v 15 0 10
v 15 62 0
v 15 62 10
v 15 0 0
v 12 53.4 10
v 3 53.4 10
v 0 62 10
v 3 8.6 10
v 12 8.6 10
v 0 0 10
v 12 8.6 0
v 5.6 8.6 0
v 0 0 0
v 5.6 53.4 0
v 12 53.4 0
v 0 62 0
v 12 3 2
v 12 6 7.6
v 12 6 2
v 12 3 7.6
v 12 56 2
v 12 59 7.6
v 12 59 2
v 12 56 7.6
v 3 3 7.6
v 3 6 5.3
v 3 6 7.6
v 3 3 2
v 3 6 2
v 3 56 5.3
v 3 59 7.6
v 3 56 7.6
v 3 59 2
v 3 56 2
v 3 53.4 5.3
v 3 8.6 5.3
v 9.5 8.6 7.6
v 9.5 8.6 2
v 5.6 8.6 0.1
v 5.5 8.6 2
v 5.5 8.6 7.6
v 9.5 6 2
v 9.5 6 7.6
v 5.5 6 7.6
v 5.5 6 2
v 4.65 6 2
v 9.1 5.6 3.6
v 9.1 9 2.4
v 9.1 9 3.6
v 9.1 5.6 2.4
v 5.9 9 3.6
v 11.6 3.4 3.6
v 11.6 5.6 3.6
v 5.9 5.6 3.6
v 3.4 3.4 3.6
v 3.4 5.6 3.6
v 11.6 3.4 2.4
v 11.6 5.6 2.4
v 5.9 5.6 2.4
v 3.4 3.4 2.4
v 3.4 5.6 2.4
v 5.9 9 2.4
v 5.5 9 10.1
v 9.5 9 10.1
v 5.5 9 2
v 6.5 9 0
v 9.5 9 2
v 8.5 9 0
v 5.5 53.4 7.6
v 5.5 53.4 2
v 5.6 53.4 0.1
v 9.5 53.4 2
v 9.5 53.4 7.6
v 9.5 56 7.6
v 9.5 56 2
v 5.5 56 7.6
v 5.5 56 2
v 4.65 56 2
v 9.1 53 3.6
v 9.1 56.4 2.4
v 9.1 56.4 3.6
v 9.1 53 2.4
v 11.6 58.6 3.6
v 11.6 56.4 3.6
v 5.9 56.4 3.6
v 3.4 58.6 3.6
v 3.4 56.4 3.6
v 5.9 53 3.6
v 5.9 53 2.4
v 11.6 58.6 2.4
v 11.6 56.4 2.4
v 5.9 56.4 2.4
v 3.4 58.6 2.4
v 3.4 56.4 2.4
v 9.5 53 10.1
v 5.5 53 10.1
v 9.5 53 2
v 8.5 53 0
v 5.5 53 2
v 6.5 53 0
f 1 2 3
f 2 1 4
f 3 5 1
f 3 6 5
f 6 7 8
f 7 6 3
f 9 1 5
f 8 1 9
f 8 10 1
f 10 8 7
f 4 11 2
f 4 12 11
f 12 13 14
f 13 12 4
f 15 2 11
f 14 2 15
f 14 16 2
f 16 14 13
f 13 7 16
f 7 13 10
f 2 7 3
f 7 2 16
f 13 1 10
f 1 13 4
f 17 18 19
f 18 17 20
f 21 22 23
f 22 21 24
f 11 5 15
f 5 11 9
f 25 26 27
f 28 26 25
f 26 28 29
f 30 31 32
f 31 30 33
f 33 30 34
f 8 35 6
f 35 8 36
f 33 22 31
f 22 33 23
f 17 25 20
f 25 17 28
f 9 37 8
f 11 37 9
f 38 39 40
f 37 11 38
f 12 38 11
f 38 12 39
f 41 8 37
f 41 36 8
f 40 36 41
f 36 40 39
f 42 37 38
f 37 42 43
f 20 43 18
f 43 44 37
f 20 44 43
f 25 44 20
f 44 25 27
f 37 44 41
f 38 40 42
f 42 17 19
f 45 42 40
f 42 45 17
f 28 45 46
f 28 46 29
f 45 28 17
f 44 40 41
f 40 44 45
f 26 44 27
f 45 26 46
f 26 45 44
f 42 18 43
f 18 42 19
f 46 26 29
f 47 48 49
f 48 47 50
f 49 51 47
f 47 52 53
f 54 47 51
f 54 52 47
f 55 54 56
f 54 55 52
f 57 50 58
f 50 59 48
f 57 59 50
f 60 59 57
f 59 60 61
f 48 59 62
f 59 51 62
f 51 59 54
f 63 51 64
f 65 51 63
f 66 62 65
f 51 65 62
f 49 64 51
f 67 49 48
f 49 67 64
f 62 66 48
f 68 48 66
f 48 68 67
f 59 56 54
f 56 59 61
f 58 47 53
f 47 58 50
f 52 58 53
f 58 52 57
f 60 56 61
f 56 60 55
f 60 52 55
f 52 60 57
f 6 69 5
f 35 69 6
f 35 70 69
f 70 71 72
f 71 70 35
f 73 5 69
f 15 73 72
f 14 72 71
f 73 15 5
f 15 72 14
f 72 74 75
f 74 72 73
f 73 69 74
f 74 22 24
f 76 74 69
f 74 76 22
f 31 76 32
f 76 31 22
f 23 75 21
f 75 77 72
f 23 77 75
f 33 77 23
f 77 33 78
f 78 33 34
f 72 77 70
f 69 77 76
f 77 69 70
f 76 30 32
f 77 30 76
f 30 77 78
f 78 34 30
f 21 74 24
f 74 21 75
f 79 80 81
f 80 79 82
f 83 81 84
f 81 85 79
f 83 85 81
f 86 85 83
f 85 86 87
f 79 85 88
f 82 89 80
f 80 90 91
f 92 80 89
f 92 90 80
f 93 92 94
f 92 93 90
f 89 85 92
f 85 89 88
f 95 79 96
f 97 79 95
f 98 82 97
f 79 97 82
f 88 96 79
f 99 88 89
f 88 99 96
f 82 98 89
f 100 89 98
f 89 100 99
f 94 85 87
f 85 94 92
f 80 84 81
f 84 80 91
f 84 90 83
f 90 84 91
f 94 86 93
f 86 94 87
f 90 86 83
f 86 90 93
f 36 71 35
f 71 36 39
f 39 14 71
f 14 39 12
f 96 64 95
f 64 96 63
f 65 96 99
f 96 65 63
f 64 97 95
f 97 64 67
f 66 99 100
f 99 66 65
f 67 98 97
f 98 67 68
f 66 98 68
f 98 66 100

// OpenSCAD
/*this mechanical buckle allows the strap to pass in one direction
the moving part moves up and down
moving up allows the strap to pass
moving down will hold on the satrap and lock it in the place
it could be used in tightning the strap for the tourniquet
instead of using dual lock velcro
**this still work in progress and not finished yet

*/
cylinder_r=2;
buckle_l=15;
buckle_w=62;
buckle_h=10;
wall_b=3;
clr=.4;
mech_t=3;
mech_t2=2;
mech_w1=4;
mech_w2=9;




difference(){
    cube([buckle_l,buckle_w,buckle_h]);
      translate([wall_b,wall_b,0])  cube([buckle_l-2*wall_b,buckle_w-2*wall_b,buckle_h]);
}
//the inside cyl
//difference(){
translate([0,wall_b+mech_t,0])hull(){//the body of the curve

translate([buckle_l/2-2,0,0])cube([.1,buckle_w-2*(wall_b+mech_t),.1]);
translate([buckle_l/2-5,0,6])cube([.1,buckle_w-2*(wall_b+mech_t),.1]);
cube([.1,buckle_w-2*(wall_b+mech_t),.1]);
}

//translate([buckle_l/2,0,3])rotate([-90,0,0])cylinder(r=cylinder_r+1,h=buckle_w);//the curvy cut
//}
//translate([buckle_l/2,wall_b+2*mech_t,2.84])rotate([-90,0,0])cylinder(r=cylinder_r,h=buckle_w-2*wall_b-4*mech_t,$fn=6);
hull(){
translate([buckle_l/2-cylinder_r/2,wall_b+2*mech_t,0])cube([cylinder_r,buckle_w-2*wall_b-4*mech_t,.1]);

translate([buckle_l/2-cylinder_r,wall_b+2*mech_t,cylinder_r])cube([2*cylinder_r,buckle_w-2*wall_b-4*mech_t,.1]);
translate([buckle_l/2-cylinder_r,wall_b+2*mech_t,buckle_h])cube([2*cylinder_r,buckle_w-2*wall_b-4*mech_t,.1]);
}
//end of inside cyl

//mechanicals
module mechs(){
translate([.5*buckle_l-mech_w1/2+clr,wall_b+mech_t-clr,mech_t2+clr])cube([mech_w1-2*clr,mech_t+clr,2*cylinder_r-mech_t2-2*clr]);//neck

translate([.5*buckle_l-mech_w2/2+clr,wall_b+clr,mech_t2+clr])cube([mech_w2-2*clr,mech_t-2*clr,2*cylinder_r-mech_t2-2*clr]);//head


//cavity
difference(){
translate([0,wall_b,0])cube([buckle_l,2*mech_t-clr,buckle_h]);



translate([.5*buckle_l-mech_w1/2,wall_b+mech_t-clr,mech_t2])cube([mech_w1,mech_t+clr,buckle_h-2*mech_t2-clr]);//neck

translate([.5*buckle_l-mech_w2/2,wall_b,mech_t2])cube([mech_w2,mech_t,buckle_h-2*mech_t2-clr]);//head

} 
    
}
mechs();
translate([0,buckle_w,0])mirror([0,1,0])mechs();
